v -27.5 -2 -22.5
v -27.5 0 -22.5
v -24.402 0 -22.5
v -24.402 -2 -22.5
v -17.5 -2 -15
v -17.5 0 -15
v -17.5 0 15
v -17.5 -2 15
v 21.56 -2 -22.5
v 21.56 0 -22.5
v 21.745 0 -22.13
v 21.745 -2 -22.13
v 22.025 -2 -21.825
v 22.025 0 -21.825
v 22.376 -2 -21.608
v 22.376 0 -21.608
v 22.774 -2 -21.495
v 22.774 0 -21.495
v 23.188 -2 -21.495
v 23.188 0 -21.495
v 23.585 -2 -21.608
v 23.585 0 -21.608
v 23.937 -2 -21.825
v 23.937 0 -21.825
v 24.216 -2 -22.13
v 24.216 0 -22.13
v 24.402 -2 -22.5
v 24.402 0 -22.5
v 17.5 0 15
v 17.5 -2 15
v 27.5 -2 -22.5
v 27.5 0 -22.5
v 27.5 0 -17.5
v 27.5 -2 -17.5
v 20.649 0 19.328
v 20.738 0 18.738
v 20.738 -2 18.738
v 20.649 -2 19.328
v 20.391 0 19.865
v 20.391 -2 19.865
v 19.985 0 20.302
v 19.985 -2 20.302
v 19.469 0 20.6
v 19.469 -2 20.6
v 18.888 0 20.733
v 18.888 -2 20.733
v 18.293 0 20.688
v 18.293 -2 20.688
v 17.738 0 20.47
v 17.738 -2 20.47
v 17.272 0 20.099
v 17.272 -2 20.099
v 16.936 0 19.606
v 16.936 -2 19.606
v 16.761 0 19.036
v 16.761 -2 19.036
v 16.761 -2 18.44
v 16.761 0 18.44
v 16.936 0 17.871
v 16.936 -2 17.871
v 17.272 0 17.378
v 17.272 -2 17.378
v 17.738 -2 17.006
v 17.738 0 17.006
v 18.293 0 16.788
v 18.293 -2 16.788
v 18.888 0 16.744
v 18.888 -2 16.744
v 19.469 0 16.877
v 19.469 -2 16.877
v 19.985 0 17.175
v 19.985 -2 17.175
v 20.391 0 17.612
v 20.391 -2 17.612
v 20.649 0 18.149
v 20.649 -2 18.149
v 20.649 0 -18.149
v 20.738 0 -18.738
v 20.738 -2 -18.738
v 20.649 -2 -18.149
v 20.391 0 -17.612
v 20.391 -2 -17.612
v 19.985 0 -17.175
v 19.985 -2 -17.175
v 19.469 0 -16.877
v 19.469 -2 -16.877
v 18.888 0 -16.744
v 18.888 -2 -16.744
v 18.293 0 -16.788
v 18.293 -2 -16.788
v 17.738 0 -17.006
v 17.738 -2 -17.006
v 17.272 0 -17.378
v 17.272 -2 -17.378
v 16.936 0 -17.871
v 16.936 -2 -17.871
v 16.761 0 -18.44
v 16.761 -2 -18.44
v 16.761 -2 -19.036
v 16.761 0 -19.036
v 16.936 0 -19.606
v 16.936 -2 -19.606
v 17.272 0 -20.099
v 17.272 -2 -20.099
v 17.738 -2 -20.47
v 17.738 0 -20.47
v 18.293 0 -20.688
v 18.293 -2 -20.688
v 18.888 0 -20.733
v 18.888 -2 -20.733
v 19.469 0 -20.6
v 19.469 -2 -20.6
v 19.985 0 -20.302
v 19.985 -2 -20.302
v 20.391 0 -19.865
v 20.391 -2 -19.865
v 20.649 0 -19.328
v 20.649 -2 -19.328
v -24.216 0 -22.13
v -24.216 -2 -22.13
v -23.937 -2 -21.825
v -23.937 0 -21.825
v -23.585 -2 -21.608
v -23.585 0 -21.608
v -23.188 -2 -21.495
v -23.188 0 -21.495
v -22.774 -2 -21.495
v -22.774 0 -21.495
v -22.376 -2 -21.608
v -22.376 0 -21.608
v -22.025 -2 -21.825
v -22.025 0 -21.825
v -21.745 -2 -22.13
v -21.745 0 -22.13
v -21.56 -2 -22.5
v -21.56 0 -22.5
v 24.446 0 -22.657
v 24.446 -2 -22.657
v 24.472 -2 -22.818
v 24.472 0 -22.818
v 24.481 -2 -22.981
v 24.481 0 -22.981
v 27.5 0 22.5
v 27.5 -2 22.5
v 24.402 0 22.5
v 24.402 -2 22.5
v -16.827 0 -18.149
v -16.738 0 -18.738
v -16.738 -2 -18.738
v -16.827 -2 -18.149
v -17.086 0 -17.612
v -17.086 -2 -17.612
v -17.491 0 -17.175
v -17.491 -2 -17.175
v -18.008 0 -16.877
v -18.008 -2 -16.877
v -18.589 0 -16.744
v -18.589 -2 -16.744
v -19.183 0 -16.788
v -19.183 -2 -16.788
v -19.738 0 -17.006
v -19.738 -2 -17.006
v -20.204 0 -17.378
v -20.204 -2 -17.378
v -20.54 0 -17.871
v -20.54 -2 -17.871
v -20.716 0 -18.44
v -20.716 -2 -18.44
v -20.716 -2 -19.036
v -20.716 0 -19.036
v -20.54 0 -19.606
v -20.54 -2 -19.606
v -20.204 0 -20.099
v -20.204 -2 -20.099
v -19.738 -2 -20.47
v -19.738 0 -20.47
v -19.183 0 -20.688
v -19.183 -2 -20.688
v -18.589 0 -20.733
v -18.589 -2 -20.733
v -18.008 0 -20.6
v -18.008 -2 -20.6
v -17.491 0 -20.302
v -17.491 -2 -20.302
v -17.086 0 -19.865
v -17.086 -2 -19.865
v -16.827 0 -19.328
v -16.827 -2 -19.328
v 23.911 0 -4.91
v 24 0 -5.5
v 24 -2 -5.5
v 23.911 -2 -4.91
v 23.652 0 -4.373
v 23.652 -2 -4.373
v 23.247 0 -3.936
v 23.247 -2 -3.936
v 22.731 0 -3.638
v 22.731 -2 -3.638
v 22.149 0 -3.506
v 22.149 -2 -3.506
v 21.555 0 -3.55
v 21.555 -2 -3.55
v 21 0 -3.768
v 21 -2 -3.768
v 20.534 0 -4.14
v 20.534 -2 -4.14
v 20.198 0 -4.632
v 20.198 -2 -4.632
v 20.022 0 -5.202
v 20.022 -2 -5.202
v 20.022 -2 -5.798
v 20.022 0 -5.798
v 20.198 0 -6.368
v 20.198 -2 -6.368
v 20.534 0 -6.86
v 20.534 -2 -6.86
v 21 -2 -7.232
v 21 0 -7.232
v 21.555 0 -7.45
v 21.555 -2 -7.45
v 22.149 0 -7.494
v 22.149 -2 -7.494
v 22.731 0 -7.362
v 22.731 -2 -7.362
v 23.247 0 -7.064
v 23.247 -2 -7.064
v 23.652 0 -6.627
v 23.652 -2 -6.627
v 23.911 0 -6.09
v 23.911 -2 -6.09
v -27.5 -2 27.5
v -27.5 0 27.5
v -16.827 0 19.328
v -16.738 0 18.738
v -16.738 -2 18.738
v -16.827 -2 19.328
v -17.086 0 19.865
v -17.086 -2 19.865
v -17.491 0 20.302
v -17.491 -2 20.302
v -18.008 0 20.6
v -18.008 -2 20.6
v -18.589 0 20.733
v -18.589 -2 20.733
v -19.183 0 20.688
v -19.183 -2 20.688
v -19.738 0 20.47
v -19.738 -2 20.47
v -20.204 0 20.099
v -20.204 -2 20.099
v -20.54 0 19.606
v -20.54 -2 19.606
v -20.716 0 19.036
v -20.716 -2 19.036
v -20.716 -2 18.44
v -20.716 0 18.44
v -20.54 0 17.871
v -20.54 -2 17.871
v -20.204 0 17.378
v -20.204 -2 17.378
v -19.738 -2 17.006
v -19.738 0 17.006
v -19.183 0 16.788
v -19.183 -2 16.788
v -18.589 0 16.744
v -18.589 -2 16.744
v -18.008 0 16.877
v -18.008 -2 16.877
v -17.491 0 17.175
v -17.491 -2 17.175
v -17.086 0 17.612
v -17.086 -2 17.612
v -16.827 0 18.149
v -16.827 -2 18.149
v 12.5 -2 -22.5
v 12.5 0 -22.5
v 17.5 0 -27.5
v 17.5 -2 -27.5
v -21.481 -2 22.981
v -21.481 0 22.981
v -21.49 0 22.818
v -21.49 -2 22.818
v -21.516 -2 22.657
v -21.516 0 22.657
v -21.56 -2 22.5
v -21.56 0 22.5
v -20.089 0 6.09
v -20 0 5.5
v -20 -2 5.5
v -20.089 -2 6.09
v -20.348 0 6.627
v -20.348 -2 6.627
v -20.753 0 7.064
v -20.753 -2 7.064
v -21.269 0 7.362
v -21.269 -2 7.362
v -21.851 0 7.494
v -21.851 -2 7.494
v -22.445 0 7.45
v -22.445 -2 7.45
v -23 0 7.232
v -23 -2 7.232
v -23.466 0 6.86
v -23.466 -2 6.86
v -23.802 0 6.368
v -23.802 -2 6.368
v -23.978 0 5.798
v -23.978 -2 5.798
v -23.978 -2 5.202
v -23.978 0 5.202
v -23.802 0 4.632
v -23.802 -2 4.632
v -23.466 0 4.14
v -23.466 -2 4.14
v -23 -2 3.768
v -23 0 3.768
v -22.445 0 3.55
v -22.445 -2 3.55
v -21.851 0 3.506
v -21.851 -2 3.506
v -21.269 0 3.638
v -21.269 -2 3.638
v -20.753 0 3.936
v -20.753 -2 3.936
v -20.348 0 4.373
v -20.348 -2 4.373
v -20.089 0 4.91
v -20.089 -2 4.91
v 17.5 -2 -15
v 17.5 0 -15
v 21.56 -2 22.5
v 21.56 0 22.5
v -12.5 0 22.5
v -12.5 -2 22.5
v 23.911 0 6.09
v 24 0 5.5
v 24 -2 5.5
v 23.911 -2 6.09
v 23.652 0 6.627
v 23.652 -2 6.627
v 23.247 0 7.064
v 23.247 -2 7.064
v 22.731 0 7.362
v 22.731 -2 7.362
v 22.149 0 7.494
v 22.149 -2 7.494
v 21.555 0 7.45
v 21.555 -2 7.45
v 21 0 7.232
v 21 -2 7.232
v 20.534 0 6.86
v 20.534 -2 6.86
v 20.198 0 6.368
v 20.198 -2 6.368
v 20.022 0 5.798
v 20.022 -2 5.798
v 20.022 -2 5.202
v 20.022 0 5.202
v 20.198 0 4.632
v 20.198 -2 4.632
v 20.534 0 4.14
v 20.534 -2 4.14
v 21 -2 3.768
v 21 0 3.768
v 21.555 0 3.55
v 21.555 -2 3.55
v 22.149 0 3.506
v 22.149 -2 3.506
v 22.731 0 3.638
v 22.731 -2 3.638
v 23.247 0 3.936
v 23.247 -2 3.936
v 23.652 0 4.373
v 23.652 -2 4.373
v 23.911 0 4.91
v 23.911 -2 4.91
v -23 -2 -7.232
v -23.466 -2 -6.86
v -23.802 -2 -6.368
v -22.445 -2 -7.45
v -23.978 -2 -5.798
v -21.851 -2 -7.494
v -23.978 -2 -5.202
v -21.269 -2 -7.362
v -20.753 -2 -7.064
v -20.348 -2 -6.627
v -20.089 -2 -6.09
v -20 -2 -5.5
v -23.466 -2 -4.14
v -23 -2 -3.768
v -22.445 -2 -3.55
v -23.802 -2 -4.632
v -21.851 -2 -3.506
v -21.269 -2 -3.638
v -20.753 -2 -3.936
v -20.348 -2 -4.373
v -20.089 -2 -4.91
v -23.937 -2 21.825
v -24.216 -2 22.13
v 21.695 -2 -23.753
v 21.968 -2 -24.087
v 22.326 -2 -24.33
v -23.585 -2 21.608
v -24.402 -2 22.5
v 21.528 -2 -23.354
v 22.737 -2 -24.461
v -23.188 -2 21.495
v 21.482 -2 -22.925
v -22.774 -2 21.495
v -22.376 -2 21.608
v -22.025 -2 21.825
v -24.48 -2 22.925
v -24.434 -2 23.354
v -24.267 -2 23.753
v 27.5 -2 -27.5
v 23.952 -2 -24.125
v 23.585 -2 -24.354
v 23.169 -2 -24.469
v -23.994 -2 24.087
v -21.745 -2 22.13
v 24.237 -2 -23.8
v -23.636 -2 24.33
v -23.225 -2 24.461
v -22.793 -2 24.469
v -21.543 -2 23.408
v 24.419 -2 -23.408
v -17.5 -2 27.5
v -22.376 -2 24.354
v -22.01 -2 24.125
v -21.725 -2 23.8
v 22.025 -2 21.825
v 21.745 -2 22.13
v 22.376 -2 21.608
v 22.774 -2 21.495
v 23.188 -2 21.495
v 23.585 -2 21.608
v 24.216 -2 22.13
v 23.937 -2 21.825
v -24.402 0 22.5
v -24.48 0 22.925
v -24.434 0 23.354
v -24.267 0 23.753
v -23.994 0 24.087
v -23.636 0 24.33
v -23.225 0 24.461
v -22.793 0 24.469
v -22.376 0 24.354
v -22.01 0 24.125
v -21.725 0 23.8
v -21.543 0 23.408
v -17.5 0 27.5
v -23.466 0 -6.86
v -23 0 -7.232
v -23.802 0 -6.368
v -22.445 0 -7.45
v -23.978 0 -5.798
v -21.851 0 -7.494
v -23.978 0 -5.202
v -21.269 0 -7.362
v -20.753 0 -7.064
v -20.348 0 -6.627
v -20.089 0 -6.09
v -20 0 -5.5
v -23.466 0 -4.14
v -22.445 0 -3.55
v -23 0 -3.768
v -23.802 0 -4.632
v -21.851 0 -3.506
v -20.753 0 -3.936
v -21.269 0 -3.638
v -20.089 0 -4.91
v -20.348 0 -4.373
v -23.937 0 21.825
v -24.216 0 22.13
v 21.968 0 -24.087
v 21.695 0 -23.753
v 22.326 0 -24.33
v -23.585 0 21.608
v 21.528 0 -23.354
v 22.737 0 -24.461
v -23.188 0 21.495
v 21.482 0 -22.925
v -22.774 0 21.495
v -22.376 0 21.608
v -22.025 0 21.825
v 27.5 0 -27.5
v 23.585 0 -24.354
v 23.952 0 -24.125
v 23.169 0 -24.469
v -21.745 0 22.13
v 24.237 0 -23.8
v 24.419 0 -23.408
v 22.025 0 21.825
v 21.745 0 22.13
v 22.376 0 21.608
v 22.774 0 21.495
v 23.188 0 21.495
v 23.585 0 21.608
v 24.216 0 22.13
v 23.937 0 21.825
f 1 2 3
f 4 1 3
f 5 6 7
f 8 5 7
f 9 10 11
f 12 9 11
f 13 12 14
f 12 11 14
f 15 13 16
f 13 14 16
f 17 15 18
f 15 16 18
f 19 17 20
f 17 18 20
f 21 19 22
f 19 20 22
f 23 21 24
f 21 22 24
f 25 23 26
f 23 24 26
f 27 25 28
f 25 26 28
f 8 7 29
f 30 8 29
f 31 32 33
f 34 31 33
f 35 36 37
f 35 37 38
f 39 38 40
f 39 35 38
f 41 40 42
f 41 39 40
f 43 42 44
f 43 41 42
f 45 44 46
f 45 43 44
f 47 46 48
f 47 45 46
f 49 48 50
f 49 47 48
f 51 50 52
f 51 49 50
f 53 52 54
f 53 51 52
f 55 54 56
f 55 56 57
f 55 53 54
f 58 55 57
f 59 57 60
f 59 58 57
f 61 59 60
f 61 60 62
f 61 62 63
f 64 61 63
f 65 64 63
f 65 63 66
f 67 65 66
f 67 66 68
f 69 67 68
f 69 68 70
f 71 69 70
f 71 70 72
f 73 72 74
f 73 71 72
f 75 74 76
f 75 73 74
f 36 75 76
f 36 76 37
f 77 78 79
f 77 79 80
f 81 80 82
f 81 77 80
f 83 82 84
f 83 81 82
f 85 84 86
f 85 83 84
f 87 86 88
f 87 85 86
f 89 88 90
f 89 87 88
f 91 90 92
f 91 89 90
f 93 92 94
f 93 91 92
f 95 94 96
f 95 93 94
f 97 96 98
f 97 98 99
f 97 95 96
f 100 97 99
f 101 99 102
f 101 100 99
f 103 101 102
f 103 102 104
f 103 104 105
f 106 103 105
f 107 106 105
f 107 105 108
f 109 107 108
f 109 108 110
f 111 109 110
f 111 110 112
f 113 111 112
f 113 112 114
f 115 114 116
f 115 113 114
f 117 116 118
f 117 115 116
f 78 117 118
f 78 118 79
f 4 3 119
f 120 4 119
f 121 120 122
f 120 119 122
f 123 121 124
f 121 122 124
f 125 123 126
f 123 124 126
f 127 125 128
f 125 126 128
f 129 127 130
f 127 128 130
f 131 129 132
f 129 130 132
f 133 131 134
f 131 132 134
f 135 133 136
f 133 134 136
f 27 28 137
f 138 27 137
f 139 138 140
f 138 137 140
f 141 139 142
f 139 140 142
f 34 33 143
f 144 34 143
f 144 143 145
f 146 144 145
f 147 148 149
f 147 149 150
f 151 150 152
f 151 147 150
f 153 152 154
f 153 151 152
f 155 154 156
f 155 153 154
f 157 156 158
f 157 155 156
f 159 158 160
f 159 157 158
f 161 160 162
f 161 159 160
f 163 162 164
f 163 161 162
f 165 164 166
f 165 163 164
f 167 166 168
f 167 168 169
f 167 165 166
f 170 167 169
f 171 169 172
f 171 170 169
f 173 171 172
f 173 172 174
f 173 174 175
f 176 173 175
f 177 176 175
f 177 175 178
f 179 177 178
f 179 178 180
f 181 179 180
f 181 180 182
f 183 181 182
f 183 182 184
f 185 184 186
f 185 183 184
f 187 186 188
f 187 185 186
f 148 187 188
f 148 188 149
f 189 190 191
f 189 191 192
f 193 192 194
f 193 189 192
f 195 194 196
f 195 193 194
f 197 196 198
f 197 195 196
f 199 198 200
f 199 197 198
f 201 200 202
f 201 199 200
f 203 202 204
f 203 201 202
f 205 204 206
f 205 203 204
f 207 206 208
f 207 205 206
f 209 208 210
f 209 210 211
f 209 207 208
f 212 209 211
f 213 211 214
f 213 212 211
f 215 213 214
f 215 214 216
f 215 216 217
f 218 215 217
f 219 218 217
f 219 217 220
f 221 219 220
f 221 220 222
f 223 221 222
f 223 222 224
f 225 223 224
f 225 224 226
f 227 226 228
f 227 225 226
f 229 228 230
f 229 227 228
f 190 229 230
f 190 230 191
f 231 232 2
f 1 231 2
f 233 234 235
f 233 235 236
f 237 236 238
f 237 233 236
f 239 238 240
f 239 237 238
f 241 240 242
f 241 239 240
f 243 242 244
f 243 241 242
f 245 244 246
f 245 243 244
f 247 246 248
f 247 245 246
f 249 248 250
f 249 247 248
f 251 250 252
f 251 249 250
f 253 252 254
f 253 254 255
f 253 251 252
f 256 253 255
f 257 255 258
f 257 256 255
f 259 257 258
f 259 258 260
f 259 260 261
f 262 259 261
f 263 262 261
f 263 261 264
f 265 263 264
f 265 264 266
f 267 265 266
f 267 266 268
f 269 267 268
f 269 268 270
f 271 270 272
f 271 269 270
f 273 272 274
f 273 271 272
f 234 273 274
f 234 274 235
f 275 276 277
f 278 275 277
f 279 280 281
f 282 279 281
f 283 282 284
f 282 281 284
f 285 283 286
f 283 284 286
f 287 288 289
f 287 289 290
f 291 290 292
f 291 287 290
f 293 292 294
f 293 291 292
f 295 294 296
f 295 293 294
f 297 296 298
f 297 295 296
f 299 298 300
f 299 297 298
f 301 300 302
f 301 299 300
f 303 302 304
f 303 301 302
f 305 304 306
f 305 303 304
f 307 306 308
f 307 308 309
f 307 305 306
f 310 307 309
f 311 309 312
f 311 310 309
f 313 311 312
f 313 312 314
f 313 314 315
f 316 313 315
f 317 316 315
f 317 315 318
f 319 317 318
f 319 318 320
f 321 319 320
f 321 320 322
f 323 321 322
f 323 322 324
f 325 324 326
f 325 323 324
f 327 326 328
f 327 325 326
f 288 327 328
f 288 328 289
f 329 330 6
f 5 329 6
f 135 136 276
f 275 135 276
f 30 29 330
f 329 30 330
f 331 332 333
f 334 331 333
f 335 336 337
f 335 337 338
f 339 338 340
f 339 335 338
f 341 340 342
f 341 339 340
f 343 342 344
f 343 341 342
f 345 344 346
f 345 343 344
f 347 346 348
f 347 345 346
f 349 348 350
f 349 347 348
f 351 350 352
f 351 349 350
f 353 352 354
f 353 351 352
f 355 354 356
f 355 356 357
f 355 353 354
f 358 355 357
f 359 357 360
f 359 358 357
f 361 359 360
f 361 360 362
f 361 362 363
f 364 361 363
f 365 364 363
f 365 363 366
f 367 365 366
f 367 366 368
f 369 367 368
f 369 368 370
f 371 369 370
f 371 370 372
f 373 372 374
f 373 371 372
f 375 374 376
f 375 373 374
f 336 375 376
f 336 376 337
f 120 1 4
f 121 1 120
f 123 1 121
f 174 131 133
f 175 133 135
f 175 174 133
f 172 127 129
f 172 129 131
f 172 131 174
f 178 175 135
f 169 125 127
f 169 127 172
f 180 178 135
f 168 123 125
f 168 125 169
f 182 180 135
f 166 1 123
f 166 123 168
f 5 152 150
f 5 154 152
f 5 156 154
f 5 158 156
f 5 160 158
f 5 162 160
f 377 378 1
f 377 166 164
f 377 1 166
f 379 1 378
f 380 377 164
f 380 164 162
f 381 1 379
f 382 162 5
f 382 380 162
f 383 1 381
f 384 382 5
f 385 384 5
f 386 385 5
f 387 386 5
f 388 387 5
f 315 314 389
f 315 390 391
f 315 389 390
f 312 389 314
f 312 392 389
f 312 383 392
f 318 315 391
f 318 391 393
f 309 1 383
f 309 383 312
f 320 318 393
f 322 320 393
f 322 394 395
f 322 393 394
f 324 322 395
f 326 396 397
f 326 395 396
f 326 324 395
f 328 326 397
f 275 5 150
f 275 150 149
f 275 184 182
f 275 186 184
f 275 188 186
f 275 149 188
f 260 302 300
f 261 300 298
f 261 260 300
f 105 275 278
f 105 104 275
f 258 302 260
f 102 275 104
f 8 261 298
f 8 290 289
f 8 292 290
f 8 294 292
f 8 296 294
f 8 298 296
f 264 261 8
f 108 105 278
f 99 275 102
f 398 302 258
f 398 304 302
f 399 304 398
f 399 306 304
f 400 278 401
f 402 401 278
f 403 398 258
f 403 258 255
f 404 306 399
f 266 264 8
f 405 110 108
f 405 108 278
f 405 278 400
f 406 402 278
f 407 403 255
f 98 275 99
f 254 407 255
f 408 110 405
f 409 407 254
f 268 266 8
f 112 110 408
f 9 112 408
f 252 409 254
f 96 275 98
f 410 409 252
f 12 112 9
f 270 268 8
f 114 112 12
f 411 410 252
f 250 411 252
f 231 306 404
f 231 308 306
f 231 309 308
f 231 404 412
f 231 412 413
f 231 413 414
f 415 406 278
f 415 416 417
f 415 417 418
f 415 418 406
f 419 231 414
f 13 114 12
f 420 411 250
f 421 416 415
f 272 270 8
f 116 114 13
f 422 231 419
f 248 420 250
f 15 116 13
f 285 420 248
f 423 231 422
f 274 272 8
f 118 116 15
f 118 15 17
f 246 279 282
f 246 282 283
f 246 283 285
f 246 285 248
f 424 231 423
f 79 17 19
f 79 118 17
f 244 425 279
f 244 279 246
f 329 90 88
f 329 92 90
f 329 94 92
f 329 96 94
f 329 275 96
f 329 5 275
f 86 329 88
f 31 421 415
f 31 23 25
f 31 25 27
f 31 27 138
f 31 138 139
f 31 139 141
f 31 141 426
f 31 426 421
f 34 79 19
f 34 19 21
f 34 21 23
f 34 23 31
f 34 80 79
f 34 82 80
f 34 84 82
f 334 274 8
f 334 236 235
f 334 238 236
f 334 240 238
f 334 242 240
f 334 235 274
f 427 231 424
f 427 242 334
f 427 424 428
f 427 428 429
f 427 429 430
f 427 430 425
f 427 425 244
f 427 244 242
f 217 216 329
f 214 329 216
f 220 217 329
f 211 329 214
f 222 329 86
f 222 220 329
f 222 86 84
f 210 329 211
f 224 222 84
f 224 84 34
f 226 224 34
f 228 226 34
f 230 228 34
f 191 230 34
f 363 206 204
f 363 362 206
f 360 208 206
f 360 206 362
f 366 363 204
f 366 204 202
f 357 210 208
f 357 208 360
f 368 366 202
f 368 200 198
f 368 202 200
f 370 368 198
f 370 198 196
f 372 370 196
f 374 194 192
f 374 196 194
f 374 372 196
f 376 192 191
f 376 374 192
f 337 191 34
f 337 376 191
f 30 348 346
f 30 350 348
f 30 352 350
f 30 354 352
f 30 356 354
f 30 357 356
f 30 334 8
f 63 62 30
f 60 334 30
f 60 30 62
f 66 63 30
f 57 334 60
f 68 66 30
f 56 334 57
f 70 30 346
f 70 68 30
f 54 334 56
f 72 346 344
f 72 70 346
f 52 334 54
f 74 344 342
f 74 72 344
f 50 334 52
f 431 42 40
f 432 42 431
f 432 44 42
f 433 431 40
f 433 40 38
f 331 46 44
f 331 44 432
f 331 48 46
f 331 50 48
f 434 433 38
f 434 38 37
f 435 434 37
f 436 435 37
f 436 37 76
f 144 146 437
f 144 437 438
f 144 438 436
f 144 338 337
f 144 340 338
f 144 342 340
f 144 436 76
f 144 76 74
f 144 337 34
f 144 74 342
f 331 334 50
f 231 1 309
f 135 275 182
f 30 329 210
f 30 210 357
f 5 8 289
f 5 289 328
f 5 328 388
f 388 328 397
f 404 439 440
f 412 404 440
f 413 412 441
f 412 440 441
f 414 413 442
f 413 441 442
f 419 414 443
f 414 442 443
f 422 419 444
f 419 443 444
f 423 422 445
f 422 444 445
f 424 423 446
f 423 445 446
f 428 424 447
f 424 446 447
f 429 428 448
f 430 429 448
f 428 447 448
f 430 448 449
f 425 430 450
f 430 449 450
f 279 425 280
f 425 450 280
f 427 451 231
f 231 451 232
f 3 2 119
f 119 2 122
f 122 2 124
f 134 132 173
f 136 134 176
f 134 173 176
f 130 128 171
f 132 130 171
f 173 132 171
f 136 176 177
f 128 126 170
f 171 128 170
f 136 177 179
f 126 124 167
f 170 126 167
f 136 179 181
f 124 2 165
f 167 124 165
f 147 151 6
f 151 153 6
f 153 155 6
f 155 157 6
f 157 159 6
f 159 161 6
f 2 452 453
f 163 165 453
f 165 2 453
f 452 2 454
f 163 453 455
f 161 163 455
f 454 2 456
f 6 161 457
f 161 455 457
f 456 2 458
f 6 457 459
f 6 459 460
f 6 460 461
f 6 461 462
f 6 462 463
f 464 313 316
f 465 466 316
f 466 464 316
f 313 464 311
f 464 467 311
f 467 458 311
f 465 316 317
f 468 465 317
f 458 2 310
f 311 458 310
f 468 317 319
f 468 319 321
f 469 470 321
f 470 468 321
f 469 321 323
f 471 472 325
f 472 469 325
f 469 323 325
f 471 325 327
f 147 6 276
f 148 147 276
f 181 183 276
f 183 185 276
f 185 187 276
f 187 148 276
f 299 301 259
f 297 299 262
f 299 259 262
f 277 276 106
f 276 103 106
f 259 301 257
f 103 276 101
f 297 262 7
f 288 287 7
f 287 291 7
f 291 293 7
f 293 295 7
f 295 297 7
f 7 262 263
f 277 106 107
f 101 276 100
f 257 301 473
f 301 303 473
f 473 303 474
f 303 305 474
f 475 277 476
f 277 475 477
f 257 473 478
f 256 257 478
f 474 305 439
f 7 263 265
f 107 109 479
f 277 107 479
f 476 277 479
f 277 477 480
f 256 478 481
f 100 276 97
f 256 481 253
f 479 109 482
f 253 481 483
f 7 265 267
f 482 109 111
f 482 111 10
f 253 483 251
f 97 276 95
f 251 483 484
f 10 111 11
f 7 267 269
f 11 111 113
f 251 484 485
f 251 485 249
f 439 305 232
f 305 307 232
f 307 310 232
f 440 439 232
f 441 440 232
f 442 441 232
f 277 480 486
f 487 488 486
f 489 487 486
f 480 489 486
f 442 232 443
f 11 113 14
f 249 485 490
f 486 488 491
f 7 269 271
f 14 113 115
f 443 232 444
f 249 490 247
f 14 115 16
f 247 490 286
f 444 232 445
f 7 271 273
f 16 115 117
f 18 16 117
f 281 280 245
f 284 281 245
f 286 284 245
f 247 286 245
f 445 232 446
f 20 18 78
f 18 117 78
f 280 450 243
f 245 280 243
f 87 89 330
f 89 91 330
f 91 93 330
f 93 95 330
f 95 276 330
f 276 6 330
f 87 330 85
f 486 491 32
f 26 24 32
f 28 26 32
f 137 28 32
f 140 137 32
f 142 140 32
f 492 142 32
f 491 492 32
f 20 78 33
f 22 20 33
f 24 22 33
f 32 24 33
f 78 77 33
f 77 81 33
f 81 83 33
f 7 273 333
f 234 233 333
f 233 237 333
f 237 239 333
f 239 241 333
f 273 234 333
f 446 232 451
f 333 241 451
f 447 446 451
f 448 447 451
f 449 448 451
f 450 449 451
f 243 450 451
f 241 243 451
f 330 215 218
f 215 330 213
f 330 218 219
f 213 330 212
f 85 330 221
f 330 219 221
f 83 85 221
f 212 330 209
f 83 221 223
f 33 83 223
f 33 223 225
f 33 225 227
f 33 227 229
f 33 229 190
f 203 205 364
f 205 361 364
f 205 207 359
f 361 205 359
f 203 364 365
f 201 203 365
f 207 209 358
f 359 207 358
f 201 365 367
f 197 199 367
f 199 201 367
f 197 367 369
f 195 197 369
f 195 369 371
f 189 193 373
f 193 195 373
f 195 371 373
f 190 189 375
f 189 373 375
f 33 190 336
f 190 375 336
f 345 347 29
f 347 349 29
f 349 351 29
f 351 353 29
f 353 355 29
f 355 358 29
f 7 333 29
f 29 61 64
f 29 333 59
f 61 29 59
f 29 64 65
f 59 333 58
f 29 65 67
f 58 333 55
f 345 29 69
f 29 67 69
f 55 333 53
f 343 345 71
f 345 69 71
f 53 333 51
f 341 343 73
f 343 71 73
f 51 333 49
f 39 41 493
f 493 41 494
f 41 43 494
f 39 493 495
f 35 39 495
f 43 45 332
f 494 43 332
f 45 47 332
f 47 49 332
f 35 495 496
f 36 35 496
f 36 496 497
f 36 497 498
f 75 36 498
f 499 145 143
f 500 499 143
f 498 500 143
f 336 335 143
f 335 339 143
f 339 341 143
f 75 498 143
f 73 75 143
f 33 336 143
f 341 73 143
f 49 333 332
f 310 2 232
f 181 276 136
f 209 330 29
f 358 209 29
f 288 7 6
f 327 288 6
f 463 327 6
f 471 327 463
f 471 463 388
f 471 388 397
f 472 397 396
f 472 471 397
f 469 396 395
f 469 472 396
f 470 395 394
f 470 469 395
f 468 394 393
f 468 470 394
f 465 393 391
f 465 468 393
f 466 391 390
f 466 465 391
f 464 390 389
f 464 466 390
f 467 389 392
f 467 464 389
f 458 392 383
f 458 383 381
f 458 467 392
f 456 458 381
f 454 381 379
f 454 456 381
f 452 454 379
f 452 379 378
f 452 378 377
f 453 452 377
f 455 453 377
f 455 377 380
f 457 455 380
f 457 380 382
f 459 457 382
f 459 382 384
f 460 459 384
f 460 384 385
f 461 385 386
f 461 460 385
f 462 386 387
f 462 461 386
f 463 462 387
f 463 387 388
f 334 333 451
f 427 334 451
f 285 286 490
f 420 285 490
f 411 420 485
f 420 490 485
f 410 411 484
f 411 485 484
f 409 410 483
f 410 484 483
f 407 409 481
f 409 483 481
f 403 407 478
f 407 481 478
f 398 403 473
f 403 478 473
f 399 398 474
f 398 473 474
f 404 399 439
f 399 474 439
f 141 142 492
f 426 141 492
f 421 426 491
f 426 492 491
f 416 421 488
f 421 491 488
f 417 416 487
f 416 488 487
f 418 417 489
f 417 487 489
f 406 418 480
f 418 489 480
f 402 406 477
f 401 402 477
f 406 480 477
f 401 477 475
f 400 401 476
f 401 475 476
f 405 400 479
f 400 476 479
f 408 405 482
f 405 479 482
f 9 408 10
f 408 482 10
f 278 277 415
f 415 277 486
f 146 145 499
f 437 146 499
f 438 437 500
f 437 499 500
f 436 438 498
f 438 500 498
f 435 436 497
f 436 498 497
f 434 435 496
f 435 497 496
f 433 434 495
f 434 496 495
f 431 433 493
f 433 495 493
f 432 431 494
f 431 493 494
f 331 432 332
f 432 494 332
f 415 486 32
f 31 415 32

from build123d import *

# Parameters (mm, degrees)
F0_R     = 2
F1_DEPTH = 2


# Not quite as in the source:
# - ends of sketch curves that miss each other by under 0.0002 mm in the source are joined
# - a feature names something its author has since deleted; it is built from what else it names


with BuildPart() as f1:
    # F0 (on Front) → F1 (new body)
    with BuildSketch(Plane.XZ):
        with BuildLine():
            Line((21.5601722026, 22.5), (-12.5000000166, 22.5))
            Line((-12.5000000166, 22.5), (-5.0000000414, 15))
            Line((-5.0000000414, 15), (17.5, 15))
            Line((17.5, 15), (17.5, -7.5000001159))
            Line((17.5, -7.5000001159), (27.499999851, -17.5))
            Line((27.499999851, -17.5), (27.5, 22.5))
            Line((27.5, 22.5), (24.4017685746, 22.5))
            ThreePointArc((24.4017685746, 22.5), (22.9809703886, 21.4809703886), (21.5601722026, 22.5))
        make_face()
        with Locations((22, -5.5)):
            Circle(F0_R, mode=Mode.SUBTRACT)
        with Locations((22, 5.5)):
            Circle(F0_R, mode=Mode.SUBTRACT)
        with Locations((18.7383297014, 18.7383297014)):
            Circle(F0_R, mode=Mode.SUBTRACT)
        with BuildLine():
            Line((27.499999851, -17.5), (17.5, -7.5000001159))
            Line((17.5, -7.5000001159), (17.5, -15))
            Line((17.5, -15), (5, -15))
            Line((5, -15), (12.5, -22.5))
            Line((12.5, -22.5), (21.5601722026, -22.5))
            ThreePointArc((21.5601722026, -22.5), (22.9809703886, -21.4809703886), (24.4017685746, -22.5))
            Line((24.4017685746, -22.5), (27.5, -22.5))
            Line((27.5, -22.5), (27.499999851, -17.5))
        make_face()
        with Locations((18.7383297014, -18.7383297014)):
            Circle(F0_R, mode=Mode.SUBTRACT)
        with BuildLine():
            Line((21.5601722026, -22.5), (12.5, -22.5))
            Line((12.5, -22.5), (17.5, -27.5))
            Line((17.5, -27.5), (27.5, -27.5))
            Line((27.5, -27.5), (27.5, -22.5))
            Line((27.5, -22.5), (24.4017685746, -22.5))
            ThreePointArc((24.4017685746, -22.5), (24.461037495, -22.7372464453), (24.4809703886, -22.9809703886))
            ThreePointArc((24.4809703886, -22.9809703886), (22.7372464453, -24.461037495), (21.5601722026, -22.5))
        make_face()
        with BuildLine():
            Line((-17.5, 7.5), (-27.5, 17.5))
            Line((-27.5, 17.5), (-27.5, -22.5))
            Line((-27.5, -22.5), (-24.4017685746, -22.5))
            ThreePointArc((-24.4017685746, -22.5), (-22.9809703886, -21.4809703886), (-21.5601722026, -22.5))
            Line((-21.5601722026, -22.5), (12.5, -22.5))
            Line((12.5, -22.5), (5, -15))
            Line((5, -15), (-17.5, -15))
            Line((-17.5, -15), (-17.5, 7.5))
        make_face()
        with Locations((-18.7383297014, -18.7383297014)):
            Circle(F0_R, mode=Mode.SUBTRACT)
        with Locations((-22, -5.5)):
            Circle(F0_R, mode=Mode.SUBTRACT)
        with Locations((-22, 5.5)):
            Circle(F0_R, mode=Mode.SUBTRACT)
        with BuildLine():
            ThreePointArc((-21.5601722026, 22.5), (-22.9809703886, 21.4809703886), (-24.4017685746, 22.5))
            Line((-24.4017685746, 22.5), (-27.5, 22.5))
            Line((-27.5, 22.5), (-27.5, 17.5))
            Line((-27.5, 17.5), (-17.5, 7.5))
            Line((-17.5, 7.5), (-17.5, 15))
            Line((-17.5, 15), (-5.0000000414, 15))
            Line((-5.0000000414, 15), (-12.5000000166, 22.5))
            Line((-12.5000000166, 22.5), (-21.5601722026, 22.5))
        make_face()
        with Locations((-18.7383297014, 18.7383297014)):
            Circle(F0_R, mode=Mode.SUBTRACT)
        with BuildLine():
            ThreePointArc((-24.4017685746, 22.5), (-23.2246943318, 24.461037495), (-21.4809703886, 22.9809703886))
            ThreePointArc((-21.4809703886, 22.9809703886), (-21.5009032821, 22.7372464453), (-21.5601722026, 22.5))
            Line((-21.5601722026, 22.5), (-12.5000000166, 22.5))
            Line((-12.5000000166, 22.5), (-17.5, 27.5))
            Line((-17.5, 27.5), (-27.5, 27.5))
            Line((-27.5, 27.5), (-27.5, 22.5))
            Line((-27.5, 22.5), (-24.4017685746, 22.5))
        make_face()
    extrude(amount=F1_DEPTH)


solid = f1.part
